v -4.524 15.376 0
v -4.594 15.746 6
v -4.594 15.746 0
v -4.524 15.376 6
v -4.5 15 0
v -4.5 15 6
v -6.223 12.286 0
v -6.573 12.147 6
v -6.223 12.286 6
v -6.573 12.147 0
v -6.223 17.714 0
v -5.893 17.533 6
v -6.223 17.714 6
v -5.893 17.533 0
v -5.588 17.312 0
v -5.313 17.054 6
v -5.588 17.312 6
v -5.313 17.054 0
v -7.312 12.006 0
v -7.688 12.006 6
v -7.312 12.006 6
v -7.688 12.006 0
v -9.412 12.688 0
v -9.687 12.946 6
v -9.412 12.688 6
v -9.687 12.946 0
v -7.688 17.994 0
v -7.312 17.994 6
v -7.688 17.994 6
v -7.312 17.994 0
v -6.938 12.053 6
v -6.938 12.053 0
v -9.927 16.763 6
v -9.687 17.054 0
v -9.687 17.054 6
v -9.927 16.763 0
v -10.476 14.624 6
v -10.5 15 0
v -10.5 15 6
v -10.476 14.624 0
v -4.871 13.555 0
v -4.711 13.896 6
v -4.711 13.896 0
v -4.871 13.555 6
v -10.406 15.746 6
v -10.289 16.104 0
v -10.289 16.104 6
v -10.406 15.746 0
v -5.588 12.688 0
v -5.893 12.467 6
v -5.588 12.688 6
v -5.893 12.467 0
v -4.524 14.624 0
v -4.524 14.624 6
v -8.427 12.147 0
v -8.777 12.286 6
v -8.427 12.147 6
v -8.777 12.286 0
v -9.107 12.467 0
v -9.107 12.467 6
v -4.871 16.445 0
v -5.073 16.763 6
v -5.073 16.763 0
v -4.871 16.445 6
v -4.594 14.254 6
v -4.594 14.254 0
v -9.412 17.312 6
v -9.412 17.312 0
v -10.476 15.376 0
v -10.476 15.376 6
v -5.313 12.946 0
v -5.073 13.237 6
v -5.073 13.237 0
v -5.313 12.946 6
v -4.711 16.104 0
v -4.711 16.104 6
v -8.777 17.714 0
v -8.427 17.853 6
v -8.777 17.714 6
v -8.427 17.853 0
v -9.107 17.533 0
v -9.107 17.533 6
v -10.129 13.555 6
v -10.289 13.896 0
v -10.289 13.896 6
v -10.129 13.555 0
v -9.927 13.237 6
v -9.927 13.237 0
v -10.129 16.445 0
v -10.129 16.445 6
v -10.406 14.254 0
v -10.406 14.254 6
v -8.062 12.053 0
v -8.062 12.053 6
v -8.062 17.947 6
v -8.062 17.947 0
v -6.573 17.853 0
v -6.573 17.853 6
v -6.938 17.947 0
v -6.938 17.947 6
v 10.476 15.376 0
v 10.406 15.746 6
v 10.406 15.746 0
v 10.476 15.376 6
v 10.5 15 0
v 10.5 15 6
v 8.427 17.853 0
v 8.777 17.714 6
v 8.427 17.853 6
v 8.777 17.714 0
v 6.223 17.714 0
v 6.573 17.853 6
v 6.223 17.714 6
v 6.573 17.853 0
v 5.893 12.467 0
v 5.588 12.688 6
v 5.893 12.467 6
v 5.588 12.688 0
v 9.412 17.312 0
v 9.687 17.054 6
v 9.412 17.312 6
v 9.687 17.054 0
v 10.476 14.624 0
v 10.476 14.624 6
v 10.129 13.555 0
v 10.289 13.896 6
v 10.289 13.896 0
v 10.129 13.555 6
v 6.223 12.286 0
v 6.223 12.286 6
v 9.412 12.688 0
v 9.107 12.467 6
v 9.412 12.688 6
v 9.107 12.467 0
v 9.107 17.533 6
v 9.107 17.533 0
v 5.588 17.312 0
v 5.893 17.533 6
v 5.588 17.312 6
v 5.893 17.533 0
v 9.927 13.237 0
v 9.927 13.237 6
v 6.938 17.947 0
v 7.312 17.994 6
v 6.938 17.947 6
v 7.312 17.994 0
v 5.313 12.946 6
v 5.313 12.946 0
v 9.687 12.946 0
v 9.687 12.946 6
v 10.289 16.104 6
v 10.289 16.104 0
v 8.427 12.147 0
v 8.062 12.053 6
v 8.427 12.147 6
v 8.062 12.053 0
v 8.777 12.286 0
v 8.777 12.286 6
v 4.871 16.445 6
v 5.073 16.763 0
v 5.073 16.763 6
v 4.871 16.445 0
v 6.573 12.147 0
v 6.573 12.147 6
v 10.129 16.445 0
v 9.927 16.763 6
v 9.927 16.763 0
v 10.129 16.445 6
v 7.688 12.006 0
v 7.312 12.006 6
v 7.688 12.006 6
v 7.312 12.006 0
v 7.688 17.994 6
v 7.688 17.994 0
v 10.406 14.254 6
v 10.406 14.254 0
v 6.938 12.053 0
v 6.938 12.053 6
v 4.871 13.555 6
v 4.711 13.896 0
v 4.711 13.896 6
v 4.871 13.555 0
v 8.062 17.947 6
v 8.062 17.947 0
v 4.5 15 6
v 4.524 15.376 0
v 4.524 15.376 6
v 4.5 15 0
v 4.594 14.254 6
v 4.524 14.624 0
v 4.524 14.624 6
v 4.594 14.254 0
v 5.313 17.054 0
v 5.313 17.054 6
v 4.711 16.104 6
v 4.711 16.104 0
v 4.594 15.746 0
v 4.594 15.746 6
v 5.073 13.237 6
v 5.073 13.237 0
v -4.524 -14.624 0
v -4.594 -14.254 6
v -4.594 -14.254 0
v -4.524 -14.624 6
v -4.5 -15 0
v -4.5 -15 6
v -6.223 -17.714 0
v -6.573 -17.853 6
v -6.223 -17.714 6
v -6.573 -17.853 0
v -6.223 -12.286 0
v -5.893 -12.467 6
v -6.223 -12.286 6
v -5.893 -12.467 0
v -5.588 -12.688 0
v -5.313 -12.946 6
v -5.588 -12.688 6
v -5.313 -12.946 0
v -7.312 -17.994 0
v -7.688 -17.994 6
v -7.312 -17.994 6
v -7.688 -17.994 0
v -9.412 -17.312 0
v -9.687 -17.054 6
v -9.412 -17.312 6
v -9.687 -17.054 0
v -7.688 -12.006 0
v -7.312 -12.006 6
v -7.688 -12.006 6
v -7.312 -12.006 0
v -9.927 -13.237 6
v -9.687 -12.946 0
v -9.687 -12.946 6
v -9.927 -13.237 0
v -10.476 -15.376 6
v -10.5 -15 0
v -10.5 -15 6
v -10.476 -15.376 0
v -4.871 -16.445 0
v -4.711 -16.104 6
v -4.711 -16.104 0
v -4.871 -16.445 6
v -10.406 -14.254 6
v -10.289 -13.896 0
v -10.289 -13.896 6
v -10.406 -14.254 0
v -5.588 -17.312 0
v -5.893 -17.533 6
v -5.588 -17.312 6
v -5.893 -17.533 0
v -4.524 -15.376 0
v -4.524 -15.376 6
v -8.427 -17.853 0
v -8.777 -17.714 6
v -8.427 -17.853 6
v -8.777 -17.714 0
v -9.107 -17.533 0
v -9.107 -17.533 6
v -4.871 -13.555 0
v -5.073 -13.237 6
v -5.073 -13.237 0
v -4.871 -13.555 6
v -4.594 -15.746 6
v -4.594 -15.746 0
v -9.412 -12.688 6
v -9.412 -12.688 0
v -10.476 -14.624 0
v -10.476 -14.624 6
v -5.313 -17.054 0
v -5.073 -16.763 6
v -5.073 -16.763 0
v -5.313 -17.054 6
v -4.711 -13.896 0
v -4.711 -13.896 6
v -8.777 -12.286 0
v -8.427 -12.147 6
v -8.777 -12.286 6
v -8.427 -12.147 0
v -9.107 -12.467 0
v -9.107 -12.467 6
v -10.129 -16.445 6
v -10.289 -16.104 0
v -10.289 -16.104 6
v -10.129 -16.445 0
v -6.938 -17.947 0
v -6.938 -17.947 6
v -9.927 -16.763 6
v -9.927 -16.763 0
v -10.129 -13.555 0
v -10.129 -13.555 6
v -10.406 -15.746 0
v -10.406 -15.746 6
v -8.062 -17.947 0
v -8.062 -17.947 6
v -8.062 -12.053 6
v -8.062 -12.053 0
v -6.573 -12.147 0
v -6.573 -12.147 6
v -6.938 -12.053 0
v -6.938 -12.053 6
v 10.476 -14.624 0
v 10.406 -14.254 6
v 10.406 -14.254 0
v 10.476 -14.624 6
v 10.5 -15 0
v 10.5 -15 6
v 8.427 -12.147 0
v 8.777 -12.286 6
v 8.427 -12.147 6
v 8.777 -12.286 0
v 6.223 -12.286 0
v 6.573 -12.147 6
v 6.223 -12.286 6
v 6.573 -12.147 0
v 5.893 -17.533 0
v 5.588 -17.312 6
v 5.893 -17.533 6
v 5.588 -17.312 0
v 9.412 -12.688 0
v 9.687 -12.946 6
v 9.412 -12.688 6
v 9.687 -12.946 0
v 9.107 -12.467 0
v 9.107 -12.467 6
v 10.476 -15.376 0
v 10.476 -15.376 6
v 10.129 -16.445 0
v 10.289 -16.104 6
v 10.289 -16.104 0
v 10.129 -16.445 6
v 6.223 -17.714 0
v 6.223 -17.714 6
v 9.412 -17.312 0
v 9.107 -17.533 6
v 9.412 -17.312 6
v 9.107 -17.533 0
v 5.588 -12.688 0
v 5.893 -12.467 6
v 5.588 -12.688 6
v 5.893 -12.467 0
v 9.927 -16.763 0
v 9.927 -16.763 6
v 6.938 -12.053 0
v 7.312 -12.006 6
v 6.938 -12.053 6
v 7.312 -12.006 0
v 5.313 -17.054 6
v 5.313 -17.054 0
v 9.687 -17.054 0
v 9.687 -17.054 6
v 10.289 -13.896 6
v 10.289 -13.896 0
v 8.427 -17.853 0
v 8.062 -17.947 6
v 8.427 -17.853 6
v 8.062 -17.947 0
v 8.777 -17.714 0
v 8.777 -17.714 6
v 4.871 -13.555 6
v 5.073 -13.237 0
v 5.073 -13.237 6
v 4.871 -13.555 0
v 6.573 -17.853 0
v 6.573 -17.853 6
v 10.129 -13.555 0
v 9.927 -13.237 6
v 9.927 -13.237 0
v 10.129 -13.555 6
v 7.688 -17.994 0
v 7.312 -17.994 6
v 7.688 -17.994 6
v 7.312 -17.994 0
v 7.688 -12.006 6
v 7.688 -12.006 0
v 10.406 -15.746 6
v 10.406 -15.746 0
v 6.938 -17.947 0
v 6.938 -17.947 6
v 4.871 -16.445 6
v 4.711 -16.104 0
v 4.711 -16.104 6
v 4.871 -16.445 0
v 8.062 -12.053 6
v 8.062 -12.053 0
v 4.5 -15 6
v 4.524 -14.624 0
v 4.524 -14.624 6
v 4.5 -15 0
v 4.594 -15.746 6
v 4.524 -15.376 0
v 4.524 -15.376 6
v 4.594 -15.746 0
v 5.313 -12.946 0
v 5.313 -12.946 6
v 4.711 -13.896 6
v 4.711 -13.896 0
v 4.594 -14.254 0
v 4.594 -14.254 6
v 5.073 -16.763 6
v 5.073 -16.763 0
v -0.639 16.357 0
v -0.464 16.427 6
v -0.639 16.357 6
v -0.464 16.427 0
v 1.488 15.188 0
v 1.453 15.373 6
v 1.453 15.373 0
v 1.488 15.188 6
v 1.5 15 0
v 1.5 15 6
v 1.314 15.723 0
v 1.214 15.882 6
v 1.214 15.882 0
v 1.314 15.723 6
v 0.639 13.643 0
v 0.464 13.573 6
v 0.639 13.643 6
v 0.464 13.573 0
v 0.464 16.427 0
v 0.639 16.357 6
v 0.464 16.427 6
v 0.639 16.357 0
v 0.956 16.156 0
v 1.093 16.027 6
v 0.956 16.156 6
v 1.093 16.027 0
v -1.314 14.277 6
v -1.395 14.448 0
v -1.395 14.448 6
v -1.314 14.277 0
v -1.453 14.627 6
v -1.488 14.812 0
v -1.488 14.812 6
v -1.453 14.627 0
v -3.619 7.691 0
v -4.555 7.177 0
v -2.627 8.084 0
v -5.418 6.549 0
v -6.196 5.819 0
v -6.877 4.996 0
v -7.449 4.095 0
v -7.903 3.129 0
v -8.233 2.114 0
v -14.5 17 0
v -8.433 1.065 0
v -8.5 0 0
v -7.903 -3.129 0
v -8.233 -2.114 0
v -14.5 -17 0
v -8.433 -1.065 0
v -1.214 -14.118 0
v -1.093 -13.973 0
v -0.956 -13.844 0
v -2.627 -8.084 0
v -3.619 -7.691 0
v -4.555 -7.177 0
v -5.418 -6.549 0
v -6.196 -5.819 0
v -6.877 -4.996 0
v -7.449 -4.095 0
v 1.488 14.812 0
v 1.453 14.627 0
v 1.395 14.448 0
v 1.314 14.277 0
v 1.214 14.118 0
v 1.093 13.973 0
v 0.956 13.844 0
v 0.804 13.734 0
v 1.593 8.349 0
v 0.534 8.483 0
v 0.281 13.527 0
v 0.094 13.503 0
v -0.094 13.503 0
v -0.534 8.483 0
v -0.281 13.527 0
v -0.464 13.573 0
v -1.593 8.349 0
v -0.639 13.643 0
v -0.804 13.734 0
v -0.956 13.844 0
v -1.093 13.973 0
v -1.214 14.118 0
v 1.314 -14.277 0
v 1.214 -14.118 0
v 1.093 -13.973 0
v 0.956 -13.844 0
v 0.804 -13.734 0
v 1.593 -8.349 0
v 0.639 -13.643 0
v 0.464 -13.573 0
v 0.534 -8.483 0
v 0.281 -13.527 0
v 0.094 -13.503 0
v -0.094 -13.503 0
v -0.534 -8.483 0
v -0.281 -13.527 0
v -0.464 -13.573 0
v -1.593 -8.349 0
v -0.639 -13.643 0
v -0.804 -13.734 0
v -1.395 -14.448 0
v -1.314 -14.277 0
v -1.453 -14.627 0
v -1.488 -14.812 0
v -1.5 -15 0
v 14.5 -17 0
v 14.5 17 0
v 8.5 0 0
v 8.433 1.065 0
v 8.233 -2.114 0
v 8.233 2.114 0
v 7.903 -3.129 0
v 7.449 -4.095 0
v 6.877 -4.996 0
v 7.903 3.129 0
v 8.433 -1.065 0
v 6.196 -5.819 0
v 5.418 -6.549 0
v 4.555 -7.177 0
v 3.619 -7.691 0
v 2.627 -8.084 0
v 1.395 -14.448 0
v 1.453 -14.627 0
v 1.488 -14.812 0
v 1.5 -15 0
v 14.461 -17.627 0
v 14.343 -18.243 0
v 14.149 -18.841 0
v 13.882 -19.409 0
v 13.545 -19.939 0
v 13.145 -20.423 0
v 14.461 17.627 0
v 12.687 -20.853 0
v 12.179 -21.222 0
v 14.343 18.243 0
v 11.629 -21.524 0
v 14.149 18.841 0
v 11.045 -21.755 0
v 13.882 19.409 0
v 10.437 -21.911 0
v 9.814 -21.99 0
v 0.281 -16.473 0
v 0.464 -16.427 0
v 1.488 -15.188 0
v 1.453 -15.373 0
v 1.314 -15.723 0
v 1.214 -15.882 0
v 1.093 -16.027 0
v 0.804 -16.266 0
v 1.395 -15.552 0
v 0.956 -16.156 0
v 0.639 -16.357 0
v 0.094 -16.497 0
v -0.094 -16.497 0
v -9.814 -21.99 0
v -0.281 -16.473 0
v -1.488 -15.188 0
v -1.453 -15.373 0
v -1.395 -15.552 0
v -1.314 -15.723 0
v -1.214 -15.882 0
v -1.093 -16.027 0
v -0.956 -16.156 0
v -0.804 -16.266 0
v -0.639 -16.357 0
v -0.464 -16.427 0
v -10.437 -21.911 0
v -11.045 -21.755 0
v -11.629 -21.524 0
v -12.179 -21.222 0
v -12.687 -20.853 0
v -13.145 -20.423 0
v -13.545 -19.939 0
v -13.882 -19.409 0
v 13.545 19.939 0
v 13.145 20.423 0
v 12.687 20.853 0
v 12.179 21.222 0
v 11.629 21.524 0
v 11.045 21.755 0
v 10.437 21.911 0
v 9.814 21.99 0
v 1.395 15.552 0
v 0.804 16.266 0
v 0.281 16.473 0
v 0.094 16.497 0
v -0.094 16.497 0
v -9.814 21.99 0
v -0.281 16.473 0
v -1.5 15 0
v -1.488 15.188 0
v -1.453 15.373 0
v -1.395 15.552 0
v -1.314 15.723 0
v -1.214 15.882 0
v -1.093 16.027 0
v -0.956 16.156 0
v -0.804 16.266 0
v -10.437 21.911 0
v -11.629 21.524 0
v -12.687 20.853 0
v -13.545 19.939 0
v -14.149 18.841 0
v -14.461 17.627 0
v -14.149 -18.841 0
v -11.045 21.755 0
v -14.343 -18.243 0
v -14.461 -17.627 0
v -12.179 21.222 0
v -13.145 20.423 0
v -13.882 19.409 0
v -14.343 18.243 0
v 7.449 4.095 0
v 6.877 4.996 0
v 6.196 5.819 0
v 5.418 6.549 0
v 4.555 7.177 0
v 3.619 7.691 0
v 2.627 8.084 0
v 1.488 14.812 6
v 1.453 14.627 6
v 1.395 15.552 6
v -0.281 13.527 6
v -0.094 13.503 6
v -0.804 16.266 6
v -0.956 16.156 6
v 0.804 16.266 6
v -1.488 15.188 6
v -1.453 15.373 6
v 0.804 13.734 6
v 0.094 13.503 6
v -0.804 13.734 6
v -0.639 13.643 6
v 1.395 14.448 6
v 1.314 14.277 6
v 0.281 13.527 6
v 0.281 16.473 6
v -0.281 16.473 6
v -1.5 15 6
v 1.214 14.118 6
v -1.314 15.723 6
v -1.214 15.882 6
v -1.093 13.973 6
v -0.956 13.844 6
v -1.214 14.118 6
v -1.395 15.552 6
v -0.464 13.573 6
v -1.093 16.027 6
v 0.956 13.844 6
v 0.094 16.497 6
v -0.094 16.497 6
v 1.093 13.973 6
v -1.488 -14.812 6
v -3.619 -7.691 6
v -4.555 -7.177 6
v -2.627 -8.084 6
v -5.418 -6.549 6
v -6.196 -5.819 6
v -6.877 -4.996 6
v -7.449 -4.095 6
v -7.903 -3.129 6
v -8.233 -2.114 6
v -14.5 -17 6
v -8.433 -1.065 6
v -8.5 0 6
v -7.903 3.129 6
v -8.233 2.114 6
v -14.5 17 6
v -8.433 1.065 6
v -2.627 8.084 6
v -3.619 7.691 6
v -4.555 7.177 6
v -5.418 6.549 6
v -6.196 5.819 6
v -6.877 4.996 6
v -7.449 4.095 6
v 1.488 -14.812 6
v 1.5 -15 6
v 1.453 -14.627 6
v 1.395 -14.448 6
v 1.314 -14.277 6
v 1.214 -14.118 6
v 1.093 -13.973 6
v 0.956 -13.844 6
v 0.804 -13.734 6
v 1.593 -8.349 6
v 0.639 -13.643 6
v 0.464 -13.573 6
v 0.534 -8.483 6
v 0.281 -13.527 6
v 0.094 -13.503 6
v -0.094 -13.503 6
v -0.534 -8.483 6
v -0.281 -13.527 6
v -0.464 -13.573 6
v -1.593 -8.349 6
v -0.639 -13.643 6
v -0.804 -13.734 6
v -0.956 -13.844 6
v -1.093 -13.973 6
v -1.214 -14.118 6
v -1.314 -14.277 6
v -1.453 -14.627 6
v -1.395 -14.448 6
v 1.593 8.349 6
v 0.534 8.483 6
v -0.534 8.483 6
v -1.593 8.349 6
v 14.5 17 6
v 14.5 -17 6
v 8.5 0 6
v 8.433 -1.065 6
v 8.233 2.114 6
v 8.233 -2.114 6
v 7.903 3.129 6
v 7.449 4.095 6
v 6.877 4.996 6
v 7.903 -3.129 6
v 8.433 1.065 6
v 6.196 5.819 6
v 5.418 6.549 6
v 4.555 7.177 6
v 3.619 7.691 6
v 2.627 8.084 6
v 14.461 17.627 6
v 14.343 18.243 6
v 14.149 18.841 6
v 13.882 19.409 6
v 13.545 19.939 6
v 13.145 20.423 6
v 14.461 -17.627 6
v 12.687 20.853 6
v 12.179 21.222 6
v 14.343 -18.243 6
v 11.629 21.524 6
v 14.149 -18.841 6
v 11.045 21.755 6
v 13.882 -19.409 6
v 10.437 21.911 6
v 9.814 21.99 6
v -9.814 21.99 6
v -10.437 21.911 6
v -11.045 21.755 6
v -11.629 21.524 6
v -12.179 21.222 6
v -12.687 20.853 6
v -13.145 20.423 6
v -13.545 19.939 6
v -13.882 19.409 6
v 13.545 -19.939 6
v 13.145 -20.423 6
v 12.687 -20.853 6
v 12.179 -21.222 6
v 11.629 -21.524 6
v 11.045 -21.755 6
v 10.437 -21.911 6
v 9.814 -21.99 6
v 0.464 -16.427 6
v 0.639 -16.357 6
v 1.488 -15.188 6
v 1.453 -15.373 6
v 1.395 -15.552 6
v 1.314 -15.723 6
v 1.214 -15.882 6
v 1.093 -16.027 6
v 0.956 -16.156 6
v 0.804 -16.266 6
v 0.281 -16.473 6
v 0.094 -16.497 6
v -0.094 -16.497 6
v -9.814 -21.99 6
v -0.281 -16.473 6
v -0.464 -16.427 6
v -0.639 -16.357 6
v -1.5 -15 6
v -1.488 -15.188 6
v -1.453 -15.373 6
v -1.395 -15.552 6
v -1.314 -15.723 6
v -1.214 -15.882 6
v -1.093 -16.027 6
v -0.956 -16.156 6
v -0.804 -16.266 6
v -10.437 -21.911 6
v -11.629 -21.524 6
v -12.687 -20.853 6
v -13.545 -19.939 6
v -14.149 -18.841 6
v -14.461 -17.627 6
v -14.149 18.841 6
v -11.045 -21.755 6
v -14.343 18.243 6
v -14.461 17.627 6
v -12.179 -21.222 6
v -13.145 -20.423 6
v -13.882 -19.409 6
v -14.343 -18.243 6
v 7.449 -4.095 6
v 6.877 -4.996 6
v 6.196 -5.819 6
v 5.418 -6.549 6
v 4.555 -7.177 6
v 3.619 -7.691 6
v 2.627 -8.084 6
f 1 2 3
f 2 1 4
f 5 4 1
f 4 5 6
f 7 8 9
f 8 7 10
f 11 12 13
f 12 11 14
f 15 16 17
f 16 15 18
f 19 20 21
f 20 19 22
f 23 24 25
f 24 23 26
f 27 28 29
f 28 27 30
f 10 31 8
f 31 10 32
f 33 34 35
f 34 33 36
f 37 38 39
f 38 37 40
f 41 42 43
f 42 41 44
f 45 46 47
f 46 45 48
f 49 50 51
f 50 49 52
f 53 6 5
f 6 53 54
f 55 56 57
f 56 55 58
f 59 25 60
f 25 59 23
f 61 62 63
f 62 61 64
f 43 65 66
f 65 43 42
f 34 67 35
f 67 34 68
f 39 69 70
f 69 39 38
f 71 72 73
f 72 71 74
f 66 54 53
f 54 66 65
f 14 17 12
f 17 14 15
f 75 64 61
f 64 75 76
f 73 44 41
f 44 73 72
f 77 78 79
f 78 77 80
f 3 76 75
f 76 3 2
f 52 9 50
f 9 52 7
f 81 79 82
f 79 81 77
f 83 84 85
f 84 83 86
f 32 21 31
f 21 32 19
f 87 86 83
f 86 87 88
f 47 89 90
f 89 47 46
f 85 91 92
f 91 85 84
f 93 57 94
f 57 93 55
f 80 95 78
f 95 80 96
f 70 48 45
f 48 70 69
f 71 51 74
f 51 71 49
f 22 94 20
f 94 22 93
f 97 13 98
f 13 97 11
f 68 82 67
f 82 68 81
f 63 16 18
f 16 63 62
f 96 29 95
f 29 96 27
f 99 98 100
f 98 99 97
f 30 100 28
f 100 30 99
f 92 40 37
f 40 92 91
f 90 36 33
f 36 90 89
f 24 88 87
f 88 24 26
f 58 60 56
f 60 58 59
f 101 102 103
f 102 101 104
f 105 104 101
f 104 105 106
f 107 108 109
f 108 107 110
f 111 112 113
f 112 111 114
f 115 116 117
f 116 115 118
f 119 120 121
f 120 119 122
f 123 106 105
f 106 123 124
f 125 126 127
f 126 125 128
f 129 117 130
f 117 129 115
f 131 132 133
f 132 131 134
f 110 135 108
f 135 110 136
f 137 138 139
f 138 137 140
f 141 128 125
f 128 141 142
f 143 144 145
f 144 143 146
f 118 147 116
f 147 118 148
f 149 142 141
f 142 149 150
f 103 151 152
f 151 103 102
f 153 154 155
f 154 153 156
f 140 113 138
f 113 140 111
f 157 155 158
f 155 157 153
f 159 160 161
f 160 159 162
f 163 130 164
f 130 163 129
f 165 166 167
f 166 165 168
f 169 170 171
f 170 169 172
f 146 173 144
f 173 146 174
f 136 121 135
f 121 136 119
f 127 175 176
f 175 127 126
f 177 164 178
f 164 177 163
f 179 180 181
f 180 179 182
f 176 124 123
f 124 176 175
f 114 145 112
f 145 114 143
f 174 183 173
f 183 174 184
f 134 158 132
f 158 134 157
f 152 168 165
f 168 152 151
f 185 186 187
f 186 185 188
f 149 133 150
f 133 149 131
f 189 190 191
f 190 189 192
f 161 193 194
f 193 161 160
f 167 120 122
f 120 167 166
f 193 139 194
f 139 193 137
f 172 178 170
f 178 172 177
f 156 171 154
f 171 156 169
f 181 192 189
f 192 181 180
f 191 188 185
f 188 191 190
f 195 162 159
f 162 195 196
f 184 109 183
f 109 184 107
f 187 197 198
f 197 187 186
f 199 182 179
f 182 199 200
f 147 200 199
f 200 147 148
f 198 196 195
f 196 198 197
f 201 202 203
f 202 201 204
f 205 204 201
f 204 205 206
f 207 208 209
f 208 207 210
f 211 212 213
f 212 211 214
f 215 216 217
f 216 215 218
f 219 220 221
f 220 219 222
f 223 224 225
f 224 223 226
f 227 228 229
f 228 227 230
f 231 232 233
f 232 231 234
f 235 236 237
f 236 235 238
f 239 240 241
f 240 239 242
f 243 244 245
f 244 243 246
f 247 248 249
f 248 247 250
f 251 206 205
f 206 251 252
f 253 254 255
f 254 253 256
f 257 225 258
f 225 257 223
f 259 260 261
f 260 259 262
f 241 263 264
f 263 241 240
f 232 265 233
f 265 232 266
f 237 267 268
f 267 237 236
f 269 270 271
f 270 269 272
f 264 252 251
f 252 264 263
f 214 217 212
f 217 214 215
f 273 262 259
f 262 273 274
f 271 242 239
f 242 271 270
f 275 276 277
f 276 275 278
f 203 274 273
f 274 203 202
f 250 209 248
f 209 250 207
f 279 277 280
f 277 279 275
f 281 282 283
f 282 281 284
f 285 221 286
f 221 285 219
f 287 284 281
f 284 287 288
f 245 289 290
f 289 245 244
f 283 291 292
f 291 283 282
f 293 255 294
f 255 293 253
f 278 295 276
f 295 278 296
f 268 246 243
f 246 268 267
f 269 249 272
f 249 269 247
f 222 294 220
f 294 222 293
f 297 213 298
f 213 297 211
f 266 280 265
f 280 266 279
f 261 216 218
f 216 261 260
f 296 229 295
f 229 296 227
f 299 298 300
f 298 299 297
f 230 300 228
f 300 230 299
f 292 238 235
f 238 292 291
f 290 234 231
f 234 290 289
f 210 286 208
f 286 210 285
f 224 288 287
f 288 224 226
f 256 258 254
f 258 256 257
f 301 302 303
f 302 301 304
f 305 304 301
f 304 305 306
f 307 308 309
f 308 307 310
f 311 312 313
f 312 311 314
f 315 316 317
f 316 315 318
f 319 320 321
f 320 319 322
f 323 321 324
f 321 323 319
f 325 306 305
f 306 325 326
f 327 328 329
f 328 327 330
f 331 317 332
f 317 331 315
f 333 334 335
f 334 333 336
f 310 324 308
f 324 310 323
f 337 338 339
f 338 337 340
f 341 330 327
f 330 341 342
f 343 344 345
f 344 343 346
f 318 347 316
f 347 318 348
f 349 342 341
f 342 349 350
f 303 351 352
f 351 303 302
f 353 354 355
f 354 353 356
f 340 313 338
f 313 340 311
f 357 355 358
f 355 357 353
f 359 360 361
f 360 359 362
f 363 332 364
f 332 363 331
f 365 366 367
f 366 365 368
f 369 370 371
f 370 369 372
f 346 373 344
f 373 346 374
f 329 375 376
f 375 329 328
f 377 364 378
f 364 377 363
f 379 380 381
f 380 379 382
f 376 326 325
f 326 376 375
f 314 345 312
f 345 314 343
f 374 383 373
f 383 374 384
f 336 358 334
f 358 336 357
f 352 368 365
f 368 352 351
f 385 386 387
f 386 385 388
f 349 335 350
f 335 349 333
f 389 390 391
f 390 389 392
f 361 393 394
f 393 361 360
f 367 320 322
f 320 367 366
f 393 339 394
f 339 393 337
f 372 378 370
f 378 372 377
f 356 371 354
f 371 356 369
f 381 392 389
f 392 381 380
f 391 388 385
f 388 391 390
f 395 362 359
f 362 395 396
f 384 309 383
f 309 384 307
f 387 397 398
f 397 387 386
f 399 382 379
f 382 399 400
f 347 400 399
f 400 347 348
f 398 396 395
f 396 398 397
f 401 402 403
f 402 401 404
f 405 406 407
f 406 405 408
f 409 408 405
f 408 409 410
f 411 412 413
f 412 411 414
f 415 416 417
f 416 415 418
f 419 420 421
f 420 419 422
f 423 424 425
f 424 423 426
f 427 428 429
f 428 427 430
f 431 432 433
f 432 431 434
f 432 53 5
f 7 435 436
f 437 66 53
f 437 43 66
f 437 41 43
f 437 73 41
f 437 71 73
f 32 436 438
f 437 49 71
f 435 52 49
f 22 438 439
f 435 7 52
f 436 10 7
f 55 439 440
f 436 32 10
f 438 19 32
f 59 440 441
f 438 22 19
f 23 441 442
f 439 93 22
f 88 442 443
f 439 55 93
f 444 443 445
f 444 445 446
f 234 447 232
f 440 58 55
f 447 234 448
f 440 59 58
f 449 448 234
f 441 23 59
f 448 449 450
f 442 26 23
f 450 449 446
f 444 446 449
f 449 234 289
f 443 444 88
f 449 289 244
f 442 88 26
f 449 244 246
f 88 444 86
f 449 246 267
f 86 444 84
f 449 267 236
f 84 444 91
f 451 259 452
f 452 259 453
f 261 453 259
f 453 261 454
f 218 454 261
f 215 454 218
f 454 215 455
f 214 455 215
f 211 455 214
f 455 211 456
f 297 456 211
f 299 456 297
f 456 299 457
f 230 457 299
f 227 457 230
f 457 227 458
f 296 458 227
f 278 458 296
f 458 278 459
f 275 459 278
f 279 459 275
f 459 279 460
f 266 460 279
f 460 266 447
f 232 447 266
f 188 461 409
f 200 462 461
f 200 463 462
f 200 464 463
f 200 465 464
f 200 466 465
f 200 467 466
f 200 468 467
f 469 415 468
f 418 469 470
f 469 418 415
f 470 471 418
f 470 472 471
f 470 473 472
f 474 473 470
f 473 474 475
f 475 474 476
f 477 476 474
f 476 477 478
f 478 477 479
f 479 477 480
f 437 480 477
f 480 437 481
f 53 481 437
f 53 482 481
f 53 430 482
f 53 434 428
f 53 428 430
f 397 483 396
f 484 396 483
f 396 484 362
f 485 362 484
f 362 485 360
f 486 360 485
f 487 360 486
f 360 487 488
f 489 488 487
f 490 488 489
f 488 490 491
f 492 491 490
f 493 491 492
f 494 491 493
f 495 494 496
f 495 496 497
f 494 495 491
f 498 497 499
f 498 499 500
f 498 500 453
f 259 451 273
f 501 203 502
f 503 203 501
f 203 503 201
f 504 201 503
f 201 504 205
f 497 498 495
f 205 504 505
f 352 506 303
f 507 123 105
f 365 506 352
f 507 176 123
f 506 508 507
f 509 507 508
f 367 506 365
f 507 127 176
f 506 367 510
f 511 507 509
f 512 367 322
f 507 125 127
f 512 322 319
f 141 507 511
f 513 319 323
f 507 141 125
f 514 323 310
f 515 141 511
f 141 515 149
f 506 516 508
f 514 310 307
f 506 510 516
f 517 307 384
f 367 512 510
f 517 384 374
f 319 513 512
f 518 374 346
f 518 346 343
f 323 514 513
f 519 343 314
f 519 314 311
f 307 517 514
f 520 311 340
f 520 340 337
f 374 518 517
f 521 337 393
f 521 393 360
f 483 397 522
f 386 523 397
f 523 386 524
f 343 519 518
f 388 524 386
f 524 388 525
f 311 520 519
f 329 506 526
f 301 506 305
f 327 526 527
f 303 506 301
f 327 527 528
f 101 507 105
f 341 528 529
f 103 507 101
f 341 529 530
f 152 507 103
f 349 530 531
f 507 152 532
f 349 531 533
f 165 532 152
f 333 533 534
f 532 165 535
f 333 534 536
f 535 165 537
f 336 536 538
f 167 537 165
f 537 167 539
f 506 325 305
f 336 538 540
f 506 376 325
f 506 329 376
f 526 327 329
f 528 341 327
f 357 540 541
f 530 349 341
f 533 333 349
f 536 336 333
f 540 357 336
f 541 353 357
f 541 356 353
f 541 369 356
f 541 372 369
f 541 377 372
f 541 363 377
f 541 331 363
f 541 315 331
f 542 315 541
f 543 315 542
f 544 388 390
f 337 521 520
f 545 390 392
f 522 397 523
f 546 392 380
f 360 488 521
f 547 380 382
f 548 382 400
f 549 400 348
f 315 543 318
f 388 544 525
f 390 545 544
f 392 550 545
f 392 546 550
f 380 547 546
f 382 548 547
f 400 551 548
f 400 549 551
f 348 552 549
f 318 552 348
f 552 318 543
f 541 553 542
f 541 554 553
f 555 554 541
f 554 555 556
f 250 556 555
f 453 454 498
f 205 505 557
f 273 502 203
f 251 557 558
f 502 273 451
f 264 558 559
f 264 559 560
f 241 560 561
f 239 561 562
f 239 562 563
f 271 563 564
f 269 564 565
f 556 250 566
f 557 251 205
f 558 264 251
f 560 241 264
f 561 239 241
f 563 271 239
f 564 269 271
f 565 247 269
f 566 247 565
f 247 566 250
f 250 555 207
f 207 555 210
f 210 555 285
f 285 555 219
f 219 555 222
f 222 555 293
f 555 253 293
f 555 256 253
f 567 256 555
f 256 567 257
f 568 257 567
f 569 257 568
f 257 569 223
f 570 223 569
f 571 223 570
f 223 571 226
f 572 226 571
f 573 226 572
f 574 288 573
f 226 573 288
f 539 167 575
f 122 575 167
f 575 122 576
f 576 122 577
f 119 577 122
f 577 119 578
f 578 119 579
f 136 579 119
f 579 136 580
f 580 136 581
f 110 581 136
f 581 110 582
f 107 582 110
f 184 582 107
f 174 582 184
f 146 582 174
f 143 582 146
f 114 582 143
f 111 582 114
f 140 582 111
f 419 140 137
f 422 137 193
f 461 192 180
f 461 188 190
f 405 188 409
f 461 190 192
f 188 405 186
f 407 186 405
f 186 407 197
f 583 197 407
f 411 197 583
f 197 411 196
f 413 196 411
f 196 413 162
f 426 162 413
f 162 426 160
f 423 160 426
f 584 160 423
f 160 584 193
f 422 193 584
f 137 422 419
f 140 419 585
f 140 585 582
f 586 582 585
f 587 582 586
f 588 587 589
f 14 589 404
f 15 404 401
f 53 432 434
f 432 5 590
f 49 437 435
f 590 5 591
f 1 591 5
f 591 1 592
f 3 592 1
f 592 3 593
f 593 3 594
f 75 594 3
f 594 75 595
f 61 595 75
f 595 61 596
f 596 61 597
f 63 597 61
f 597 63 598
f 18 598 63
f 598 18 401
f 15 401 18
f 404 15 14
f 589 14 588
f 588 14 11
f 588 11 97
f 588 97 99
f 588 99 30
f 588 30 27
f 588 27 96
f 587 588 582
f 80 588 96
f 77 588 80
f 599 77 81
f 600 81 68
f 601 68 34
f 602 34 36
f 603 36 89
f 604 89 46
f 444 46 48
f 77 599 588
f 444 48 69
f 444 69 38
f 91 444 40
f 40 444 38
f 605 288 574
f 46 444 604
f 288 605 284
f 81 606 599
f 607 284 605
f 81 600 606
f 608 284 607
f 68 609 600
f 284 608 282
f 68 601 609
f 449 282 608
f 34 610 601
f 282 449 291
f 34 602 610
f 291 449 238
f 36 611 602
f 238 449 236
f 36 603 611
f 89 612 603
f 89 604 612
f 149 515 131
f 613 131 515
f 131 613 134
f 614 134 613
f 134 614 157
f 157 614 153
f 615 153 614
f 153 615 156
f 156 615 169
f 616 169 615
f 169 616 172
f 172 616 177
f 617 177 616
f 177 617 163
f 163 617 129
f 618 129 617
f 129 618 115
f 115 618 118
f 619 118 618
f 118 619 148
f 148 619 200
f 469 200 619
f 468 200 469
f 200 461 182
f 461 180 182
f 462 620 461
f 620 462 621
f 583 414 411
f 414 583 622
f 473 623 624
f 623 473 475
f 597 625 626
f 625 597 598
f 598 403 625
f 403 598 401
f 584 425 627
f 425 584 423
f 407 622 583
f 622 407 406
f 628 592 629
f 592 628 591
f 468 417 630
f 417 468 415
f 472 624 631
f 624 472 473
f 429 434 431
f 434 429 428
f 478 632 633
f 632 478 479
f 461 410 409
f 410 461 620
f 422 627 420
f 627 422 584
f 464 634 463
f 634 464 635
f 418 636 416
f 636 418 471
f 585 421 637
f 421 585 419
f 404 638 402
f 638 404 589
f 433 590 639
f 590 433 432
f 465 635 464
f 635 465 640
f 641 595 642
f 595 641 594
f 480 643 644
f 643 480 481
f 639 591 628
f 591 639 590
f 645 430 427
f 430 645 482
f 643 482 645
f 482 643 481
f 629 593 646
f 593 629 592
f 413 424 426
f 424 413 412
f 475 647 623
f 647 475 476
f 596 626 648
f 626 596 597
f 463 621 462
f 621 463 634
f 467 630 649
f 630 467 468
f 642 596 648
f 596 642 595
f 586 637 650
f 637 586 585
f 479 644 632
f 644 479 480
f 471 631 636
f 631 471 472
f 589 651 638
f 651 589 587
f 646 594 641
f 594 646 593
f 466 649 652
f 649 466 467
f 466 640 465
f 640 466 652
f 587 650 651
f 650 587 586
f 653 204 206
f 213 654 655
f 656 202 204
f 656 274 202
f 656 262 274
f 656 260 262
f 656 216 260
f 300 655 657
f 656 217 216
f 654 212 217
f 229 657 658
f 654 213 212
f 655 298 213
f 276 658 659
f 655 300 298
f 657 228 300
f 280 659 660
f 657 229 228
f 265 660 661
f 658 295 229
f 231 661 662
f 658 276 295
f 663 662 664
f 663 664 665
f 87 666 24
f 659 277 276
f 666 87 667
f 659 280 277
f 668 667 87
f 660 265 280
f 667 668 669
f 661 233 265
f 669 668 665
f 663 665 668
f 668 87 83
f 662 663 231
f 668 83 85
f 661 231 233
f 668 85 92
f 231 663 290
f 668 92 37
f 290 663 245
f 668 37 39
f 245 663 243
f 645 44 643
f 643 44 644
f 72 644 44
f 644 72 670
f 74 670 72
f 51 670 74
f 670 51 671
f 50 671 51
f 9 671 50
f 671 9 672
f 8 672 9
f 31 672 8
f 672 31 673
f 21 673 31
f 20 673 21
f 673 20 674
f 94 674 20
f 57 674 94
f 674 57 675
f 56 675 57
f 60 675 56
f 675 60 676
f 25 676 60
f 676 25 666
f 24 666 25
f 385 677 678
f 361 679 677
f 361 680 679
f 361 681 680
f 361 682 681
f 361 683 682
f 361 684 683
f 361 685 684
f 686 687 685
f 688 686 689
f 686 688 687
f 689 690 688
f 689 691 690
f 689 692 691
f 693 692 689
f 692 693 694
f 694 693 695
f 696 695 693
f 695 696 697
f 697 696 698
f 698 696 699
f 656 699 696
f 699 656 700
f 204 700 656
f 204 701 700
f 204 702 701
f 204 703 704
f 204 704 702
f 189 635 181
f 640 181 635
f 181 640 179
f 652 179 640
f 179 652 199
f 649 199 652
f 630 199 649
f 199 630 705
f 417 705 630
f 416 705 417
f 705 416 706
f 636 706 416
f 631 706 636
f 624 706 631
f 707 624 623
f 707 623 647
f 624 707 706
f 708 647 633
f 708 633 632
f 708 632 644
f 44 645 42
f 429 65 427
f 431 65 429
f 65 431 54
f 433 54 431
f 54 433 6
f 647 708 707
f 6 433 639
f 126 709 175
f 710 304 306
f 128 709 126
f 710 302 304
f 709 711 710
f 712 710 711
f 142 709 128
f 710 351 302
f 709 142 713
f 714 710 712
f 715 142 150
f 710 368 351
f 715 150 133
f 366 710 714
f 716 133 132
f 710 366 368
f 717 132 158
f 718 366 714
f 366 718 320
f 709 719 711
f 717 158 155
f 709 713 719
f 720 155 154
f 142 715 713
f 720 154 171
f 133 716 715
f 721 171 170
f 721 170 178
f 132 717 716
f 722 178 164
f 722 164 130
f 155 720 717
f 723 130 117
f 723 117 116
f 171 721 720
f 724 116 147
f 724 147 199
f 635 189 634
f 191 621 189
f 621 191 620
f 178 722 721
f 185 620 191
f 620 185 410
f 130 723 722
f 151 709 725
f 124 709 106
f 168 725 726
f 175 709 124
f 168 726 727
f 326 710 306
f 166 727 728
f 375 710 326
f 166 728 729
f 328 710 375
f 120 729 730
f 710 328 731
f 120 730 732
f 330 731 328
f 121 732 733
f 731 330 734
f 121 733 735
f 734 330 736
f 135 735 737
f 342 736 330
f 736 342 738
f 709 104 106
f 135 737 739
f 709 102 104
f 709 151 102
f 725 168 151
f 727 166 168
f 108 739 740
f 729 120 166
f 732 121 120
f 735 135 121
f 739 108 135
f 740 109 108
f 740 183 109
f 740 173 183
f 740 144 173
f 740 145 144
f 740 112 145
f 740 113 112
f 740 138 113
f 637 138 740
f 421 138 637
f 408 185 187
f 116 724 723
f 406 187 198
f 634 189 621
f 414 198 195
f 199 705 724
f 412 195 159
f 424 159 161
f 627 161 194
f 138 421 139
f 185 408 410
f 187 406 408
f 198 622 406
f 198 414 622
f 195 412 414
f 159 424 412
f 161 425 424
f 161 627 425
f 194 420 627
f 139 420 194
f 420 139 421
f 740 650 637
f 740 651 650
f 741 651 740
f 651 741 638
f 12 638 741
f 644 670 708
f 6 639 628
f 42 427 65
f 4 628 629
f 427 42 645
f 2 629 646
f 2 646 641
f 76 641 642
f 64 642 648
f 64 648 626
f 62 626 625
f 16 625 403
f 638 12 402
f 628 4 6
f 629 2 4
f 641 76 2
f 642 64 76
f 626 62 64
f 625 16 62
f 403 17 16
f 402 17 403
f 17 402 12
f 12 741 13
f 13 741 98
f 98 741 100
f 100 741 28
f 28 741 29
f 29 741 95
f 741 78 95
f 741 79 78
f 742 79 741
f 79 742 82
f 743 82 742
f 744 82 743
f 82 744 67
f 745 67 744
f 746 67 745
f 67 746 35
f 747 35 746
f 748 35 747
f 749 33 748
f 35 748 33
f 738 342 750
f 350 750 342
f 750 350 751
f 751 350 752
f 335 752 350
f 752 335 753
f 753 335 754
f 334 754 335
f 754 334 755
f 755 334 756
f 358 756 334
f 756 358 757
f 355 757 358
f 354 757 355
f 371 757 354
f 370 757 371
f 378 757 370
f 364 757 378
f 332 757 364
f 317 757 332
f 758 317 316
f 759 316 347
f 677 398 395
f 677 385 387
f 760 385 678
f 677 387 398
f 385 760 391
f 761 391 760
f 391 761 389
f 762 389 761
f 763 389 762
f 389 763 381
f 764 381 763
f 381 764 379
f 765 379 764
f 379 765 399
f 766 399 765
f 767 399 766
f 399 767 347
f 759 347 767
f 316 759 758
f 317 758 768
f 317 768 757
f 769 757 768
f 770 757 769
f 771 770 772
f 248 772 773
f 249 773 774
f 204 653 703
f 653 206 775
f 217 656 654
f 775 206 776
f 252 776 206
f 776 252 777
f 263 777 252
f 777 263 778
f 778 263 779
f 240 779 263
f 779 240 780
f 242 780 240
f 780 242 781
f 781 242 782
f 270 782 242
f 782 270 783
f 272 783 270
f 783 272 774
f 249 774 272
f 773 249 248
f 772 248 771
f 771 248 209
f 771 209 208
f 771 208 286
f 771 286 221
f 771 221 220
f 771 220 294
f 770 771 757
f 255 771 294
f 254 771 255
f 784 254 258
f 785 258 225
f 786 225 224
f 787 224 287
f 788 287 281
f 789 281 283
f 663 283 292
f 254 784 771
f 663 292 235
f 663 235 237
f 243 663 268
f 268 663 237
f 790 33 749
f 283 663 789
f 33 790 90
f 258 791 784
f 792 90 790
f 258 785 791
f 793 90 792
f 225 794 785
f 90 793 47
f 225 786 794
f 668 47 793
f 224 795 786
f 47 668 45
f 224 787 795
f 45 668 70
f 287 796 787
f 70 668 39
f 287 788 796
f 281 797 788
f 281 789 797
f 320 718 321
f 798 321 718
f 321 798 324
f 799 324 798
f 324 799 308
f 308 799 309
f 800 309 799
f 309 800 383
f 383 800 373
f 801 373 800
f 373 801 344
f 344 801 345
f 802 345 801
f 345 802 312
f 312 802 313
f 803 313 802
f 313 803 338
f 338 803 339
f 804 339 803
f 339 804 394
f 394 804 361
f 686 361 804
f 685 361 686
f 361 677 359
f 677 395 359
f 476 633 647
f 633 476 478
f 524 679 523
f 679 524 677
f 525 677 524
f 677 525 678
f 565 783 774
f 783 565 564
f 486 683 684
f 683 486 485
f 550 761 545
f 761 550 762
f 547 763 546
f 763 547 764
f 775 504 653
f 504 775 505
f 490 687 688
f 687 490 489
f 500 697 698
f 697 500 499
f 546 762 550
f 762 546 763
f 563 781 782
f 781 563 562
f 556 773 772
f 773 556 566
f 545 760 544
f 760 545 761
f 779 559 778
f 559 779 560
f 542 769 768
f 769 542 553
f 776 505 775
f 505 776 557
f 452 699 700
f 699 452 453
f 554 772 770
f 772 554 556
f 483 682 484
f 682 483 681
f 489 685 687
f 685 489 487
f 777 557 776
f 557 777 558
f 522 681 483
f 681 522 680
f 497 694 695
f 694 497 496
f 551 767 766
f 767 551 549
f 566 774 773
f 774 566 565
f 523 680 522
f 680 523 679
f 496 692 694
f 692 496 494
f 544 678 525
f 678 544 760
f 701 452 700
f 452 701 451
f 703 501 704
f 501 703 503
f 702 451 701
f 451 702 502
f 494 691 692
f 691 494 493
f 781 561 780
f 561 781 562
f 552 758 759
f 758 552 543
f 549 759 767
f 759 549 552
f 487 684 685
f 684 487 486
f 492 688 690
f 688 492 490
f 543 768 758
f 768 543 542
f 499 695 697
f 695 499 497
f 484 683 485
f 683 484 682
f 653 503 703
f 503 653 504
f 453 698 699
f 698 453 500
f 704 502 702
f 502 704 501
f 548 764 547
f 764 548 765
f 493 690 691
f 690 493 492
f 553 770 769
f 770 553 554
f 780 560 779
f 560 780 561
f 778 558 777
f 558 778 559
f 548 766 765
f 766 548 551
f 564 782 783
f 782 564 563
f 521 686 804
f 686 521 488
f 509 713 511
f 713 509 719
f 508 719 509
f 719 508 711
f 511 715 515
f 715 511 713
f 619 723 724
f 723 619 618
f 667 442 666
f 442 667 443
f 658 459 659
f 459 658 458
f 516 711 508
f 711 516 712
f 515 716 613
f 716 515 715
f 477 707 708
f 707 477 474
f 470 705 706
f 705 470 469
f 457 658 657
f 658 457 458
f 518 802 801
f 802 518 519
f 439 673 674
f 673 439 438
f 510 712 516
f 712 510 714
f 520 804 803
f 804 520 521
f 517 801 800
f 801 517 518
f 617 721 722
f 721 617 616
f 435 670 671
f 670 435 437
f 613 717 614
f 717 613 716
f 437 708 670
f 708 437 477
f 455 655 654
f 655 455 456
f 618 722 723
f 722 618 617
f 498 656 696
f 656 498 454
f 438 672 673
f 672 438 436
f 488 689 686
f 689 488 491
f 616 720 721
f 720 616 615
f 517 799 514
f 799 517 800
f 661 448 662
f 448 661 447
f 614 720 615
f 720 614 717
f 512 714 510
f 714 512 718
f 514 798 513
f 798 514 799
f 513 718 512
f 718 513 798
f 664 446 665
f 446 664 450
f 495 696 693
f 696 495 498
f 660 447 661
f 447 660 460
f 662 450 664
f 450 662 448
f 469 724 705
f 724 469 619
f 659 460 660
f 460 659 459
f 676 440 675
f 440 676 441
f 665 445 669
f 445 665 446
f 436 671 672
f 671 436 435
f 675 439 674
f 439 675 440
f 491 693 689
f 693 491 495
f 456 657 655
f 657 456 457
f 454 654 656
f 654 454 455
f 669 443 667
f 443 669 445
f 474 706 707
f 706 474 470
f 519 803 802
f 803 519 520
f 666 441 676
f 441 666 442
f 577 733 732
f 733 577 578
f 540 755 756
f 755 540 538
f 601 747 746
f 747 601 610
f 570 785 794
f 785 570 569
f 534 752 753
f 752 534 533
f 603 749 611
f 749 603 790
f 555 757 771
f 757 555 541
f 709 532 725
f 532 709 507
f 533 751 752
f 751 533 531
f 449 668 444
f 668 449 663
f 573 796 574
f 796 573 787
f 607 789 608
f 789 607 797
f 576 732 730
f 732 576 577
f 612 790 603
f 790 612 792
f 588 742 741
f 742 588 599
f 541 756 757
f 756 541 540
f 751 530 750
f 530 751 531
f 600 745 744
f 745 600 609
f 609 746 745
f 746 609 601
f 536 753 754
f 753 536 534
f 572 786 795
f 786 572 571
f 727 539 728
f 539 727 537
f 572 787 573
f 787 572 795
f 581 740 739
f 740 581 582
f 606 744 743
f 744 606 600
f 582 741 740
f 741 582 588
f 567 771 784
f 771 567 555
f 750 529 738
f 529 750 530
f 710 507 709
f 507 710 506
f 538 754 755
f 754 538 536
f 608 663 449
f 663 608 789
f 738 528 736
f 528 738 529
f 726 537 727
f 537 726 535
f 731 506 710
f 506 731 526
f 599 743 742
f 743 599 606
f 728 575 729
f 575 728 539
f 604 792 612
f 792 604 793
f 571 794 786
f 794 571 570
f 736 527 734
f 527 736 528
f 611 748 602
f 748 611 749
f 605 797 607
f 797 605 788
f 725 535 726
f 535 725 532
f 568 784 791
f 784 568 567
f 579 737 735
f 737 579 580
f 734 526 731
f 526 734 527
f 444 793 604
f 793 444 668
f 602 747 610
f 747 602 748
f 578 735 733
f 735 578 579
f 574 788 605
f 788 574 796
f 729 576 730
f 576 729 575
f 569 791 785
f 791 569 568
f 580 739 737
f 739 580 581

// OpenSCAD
$fn = 50;


difference() {
	union() {
		hull() {
			translate(v = [-9.5000000000, 17.0000000000, 0]) {
				cylinder(h = 6, r = 5);
			}
			translate(v = [9.5000000000, 17.0000000000, 0]) {
				cylinder(h = 6, r = 5);
			}
			translate(v = [-9.5000000000, -17.0000000000, 0]) {
				cylinder(h = 6, r = 5);
			}
			translate(v = [9.5000000000, -17.0000000000, 0]) {
				cylinder(h = 6, r = 5);
			}
		}
	}
	union() {
		#translate(v = [-7.5000000000, 15.0000000000, 0]) {
			cylinder(h = 6, r = 3.0000000000);
		}
		#translate(v = [7.5000000000, 15.0000000000, 0]) {
			cylinder(h = 6, r = 3.0000000000);
		}
		#translate(v = [-7.5000000000, -15.0000000000, 0]) {
			cylinder(h = 6, r = 3.0000000000);
		}
		#translate(v = [7.5000000000, -15.0000000000, 0]) {
			cylinder(h = 6, r = 3.0000000000);
		}
		#translate(v = [-7.5000000000, -15.0000000000, -100.0000000000]) {
			cylinder(h = 200, r = 3.0000000000);
		}
		#translate(v = [-7.5000000000, 15.0000000000, -100.0000000000]) {
			cylinder(h = 200, r = 3.0000000000);
		}
		#translate(v = [7.5000000000, -15.0000000000, -100.0000000000]) {
			cylinder(h = 200, r = 3.0000000000);
		}
		#translate(v = [7.5000000000, 15.0000000000, -100.0000000000]) {
			cylinder(h = 200, r = 3.0000000000);
		}
		#translate(v = [-7.5000000000, 15.0000000000, 0]) {
			cylinder(h = 6, r = 1.5000000000);
		}
		#translate(v = [0.0000000000, 15.0000000000, 0]) {
			cylinder(h = 6, r = 1.5000000000);
		}
		#translate(v = [7.5000000000, 15.0000000000, 0]) {
			cylinder(h = 6, r = 1.5000000000);
		}
		#translate(v = [-7.5000000000, -15.0000000000, 0]) {
			cylinder(h = 6, r = 1.5000000000);
		}
		#translate(v = [0.0000000000, -15.0000000000, 0]) {
			cylinder(h = 6, r = 1.5000000000);
		}
		#translate(v = [7.5000000000, -15.0000000000, 0]) {
			cylinder(h = 6, r = 1.5000000000);
		}
		#translate(v = [-7.5000000000, 15.0000000000, 0]) {
			cylinder(h = 6, r = 1.5000000000);
		}
		#translate(v = [0.0000000000, 15.0000000000, 0]) {
			cylinder(h = 6, r = 1.5000000000);
		}
		#translate(v = [7.5000000000, 15.0000000000, 0]) {
			cylinder(h = 6, r = 1.5000000000);
		}
		#translate(v = [-7.5000000000, -15.0000000000, 0]) {
			cylinder(h = 6, r = 1.5000000000);
		}
		#translate(v = [0.0000000000, -15.0000000000, 0]) {
			cylinder(h = 6, r = 1.5000000000);
		}
		#translate(v = [7.5000000000, -15.0000000000, 0]) {
			cylinder(h = 6, r = 1.5000000000);
		}
		#translate(v = [-7.5000000000, 15.0000000000, 0]) {
			cylinder(h = 6, r = 1.5000000000);
		}
		#translate(v = [0.0000000000, 15.0000000000, 0]) {
			cylinder(h = 6, r = 1.5000000000);
		}
		#translate(v = [7.5000000000, 15.0000000000, 0]) {
			cylinder(h = 6, r = 1.5000000000);
		}
		#translate(v = [-7.5000000000, -15.0000000000, 0]) {
			cylinder(h = 6, r = 1.5000000000);
		}
		#translate(v = [0.0000000000, -15.0000000000, 0]) {
			cylinder(h = 6, r = 1.5000000000);
		}
		#translate(v = [7.5000000000, -15.0000000000, 0]) {
			cylinder(h = 6, r = 1.5000000000);
		}
		#cylinder(h = 6, r = 8.5000000000);
	}
}
